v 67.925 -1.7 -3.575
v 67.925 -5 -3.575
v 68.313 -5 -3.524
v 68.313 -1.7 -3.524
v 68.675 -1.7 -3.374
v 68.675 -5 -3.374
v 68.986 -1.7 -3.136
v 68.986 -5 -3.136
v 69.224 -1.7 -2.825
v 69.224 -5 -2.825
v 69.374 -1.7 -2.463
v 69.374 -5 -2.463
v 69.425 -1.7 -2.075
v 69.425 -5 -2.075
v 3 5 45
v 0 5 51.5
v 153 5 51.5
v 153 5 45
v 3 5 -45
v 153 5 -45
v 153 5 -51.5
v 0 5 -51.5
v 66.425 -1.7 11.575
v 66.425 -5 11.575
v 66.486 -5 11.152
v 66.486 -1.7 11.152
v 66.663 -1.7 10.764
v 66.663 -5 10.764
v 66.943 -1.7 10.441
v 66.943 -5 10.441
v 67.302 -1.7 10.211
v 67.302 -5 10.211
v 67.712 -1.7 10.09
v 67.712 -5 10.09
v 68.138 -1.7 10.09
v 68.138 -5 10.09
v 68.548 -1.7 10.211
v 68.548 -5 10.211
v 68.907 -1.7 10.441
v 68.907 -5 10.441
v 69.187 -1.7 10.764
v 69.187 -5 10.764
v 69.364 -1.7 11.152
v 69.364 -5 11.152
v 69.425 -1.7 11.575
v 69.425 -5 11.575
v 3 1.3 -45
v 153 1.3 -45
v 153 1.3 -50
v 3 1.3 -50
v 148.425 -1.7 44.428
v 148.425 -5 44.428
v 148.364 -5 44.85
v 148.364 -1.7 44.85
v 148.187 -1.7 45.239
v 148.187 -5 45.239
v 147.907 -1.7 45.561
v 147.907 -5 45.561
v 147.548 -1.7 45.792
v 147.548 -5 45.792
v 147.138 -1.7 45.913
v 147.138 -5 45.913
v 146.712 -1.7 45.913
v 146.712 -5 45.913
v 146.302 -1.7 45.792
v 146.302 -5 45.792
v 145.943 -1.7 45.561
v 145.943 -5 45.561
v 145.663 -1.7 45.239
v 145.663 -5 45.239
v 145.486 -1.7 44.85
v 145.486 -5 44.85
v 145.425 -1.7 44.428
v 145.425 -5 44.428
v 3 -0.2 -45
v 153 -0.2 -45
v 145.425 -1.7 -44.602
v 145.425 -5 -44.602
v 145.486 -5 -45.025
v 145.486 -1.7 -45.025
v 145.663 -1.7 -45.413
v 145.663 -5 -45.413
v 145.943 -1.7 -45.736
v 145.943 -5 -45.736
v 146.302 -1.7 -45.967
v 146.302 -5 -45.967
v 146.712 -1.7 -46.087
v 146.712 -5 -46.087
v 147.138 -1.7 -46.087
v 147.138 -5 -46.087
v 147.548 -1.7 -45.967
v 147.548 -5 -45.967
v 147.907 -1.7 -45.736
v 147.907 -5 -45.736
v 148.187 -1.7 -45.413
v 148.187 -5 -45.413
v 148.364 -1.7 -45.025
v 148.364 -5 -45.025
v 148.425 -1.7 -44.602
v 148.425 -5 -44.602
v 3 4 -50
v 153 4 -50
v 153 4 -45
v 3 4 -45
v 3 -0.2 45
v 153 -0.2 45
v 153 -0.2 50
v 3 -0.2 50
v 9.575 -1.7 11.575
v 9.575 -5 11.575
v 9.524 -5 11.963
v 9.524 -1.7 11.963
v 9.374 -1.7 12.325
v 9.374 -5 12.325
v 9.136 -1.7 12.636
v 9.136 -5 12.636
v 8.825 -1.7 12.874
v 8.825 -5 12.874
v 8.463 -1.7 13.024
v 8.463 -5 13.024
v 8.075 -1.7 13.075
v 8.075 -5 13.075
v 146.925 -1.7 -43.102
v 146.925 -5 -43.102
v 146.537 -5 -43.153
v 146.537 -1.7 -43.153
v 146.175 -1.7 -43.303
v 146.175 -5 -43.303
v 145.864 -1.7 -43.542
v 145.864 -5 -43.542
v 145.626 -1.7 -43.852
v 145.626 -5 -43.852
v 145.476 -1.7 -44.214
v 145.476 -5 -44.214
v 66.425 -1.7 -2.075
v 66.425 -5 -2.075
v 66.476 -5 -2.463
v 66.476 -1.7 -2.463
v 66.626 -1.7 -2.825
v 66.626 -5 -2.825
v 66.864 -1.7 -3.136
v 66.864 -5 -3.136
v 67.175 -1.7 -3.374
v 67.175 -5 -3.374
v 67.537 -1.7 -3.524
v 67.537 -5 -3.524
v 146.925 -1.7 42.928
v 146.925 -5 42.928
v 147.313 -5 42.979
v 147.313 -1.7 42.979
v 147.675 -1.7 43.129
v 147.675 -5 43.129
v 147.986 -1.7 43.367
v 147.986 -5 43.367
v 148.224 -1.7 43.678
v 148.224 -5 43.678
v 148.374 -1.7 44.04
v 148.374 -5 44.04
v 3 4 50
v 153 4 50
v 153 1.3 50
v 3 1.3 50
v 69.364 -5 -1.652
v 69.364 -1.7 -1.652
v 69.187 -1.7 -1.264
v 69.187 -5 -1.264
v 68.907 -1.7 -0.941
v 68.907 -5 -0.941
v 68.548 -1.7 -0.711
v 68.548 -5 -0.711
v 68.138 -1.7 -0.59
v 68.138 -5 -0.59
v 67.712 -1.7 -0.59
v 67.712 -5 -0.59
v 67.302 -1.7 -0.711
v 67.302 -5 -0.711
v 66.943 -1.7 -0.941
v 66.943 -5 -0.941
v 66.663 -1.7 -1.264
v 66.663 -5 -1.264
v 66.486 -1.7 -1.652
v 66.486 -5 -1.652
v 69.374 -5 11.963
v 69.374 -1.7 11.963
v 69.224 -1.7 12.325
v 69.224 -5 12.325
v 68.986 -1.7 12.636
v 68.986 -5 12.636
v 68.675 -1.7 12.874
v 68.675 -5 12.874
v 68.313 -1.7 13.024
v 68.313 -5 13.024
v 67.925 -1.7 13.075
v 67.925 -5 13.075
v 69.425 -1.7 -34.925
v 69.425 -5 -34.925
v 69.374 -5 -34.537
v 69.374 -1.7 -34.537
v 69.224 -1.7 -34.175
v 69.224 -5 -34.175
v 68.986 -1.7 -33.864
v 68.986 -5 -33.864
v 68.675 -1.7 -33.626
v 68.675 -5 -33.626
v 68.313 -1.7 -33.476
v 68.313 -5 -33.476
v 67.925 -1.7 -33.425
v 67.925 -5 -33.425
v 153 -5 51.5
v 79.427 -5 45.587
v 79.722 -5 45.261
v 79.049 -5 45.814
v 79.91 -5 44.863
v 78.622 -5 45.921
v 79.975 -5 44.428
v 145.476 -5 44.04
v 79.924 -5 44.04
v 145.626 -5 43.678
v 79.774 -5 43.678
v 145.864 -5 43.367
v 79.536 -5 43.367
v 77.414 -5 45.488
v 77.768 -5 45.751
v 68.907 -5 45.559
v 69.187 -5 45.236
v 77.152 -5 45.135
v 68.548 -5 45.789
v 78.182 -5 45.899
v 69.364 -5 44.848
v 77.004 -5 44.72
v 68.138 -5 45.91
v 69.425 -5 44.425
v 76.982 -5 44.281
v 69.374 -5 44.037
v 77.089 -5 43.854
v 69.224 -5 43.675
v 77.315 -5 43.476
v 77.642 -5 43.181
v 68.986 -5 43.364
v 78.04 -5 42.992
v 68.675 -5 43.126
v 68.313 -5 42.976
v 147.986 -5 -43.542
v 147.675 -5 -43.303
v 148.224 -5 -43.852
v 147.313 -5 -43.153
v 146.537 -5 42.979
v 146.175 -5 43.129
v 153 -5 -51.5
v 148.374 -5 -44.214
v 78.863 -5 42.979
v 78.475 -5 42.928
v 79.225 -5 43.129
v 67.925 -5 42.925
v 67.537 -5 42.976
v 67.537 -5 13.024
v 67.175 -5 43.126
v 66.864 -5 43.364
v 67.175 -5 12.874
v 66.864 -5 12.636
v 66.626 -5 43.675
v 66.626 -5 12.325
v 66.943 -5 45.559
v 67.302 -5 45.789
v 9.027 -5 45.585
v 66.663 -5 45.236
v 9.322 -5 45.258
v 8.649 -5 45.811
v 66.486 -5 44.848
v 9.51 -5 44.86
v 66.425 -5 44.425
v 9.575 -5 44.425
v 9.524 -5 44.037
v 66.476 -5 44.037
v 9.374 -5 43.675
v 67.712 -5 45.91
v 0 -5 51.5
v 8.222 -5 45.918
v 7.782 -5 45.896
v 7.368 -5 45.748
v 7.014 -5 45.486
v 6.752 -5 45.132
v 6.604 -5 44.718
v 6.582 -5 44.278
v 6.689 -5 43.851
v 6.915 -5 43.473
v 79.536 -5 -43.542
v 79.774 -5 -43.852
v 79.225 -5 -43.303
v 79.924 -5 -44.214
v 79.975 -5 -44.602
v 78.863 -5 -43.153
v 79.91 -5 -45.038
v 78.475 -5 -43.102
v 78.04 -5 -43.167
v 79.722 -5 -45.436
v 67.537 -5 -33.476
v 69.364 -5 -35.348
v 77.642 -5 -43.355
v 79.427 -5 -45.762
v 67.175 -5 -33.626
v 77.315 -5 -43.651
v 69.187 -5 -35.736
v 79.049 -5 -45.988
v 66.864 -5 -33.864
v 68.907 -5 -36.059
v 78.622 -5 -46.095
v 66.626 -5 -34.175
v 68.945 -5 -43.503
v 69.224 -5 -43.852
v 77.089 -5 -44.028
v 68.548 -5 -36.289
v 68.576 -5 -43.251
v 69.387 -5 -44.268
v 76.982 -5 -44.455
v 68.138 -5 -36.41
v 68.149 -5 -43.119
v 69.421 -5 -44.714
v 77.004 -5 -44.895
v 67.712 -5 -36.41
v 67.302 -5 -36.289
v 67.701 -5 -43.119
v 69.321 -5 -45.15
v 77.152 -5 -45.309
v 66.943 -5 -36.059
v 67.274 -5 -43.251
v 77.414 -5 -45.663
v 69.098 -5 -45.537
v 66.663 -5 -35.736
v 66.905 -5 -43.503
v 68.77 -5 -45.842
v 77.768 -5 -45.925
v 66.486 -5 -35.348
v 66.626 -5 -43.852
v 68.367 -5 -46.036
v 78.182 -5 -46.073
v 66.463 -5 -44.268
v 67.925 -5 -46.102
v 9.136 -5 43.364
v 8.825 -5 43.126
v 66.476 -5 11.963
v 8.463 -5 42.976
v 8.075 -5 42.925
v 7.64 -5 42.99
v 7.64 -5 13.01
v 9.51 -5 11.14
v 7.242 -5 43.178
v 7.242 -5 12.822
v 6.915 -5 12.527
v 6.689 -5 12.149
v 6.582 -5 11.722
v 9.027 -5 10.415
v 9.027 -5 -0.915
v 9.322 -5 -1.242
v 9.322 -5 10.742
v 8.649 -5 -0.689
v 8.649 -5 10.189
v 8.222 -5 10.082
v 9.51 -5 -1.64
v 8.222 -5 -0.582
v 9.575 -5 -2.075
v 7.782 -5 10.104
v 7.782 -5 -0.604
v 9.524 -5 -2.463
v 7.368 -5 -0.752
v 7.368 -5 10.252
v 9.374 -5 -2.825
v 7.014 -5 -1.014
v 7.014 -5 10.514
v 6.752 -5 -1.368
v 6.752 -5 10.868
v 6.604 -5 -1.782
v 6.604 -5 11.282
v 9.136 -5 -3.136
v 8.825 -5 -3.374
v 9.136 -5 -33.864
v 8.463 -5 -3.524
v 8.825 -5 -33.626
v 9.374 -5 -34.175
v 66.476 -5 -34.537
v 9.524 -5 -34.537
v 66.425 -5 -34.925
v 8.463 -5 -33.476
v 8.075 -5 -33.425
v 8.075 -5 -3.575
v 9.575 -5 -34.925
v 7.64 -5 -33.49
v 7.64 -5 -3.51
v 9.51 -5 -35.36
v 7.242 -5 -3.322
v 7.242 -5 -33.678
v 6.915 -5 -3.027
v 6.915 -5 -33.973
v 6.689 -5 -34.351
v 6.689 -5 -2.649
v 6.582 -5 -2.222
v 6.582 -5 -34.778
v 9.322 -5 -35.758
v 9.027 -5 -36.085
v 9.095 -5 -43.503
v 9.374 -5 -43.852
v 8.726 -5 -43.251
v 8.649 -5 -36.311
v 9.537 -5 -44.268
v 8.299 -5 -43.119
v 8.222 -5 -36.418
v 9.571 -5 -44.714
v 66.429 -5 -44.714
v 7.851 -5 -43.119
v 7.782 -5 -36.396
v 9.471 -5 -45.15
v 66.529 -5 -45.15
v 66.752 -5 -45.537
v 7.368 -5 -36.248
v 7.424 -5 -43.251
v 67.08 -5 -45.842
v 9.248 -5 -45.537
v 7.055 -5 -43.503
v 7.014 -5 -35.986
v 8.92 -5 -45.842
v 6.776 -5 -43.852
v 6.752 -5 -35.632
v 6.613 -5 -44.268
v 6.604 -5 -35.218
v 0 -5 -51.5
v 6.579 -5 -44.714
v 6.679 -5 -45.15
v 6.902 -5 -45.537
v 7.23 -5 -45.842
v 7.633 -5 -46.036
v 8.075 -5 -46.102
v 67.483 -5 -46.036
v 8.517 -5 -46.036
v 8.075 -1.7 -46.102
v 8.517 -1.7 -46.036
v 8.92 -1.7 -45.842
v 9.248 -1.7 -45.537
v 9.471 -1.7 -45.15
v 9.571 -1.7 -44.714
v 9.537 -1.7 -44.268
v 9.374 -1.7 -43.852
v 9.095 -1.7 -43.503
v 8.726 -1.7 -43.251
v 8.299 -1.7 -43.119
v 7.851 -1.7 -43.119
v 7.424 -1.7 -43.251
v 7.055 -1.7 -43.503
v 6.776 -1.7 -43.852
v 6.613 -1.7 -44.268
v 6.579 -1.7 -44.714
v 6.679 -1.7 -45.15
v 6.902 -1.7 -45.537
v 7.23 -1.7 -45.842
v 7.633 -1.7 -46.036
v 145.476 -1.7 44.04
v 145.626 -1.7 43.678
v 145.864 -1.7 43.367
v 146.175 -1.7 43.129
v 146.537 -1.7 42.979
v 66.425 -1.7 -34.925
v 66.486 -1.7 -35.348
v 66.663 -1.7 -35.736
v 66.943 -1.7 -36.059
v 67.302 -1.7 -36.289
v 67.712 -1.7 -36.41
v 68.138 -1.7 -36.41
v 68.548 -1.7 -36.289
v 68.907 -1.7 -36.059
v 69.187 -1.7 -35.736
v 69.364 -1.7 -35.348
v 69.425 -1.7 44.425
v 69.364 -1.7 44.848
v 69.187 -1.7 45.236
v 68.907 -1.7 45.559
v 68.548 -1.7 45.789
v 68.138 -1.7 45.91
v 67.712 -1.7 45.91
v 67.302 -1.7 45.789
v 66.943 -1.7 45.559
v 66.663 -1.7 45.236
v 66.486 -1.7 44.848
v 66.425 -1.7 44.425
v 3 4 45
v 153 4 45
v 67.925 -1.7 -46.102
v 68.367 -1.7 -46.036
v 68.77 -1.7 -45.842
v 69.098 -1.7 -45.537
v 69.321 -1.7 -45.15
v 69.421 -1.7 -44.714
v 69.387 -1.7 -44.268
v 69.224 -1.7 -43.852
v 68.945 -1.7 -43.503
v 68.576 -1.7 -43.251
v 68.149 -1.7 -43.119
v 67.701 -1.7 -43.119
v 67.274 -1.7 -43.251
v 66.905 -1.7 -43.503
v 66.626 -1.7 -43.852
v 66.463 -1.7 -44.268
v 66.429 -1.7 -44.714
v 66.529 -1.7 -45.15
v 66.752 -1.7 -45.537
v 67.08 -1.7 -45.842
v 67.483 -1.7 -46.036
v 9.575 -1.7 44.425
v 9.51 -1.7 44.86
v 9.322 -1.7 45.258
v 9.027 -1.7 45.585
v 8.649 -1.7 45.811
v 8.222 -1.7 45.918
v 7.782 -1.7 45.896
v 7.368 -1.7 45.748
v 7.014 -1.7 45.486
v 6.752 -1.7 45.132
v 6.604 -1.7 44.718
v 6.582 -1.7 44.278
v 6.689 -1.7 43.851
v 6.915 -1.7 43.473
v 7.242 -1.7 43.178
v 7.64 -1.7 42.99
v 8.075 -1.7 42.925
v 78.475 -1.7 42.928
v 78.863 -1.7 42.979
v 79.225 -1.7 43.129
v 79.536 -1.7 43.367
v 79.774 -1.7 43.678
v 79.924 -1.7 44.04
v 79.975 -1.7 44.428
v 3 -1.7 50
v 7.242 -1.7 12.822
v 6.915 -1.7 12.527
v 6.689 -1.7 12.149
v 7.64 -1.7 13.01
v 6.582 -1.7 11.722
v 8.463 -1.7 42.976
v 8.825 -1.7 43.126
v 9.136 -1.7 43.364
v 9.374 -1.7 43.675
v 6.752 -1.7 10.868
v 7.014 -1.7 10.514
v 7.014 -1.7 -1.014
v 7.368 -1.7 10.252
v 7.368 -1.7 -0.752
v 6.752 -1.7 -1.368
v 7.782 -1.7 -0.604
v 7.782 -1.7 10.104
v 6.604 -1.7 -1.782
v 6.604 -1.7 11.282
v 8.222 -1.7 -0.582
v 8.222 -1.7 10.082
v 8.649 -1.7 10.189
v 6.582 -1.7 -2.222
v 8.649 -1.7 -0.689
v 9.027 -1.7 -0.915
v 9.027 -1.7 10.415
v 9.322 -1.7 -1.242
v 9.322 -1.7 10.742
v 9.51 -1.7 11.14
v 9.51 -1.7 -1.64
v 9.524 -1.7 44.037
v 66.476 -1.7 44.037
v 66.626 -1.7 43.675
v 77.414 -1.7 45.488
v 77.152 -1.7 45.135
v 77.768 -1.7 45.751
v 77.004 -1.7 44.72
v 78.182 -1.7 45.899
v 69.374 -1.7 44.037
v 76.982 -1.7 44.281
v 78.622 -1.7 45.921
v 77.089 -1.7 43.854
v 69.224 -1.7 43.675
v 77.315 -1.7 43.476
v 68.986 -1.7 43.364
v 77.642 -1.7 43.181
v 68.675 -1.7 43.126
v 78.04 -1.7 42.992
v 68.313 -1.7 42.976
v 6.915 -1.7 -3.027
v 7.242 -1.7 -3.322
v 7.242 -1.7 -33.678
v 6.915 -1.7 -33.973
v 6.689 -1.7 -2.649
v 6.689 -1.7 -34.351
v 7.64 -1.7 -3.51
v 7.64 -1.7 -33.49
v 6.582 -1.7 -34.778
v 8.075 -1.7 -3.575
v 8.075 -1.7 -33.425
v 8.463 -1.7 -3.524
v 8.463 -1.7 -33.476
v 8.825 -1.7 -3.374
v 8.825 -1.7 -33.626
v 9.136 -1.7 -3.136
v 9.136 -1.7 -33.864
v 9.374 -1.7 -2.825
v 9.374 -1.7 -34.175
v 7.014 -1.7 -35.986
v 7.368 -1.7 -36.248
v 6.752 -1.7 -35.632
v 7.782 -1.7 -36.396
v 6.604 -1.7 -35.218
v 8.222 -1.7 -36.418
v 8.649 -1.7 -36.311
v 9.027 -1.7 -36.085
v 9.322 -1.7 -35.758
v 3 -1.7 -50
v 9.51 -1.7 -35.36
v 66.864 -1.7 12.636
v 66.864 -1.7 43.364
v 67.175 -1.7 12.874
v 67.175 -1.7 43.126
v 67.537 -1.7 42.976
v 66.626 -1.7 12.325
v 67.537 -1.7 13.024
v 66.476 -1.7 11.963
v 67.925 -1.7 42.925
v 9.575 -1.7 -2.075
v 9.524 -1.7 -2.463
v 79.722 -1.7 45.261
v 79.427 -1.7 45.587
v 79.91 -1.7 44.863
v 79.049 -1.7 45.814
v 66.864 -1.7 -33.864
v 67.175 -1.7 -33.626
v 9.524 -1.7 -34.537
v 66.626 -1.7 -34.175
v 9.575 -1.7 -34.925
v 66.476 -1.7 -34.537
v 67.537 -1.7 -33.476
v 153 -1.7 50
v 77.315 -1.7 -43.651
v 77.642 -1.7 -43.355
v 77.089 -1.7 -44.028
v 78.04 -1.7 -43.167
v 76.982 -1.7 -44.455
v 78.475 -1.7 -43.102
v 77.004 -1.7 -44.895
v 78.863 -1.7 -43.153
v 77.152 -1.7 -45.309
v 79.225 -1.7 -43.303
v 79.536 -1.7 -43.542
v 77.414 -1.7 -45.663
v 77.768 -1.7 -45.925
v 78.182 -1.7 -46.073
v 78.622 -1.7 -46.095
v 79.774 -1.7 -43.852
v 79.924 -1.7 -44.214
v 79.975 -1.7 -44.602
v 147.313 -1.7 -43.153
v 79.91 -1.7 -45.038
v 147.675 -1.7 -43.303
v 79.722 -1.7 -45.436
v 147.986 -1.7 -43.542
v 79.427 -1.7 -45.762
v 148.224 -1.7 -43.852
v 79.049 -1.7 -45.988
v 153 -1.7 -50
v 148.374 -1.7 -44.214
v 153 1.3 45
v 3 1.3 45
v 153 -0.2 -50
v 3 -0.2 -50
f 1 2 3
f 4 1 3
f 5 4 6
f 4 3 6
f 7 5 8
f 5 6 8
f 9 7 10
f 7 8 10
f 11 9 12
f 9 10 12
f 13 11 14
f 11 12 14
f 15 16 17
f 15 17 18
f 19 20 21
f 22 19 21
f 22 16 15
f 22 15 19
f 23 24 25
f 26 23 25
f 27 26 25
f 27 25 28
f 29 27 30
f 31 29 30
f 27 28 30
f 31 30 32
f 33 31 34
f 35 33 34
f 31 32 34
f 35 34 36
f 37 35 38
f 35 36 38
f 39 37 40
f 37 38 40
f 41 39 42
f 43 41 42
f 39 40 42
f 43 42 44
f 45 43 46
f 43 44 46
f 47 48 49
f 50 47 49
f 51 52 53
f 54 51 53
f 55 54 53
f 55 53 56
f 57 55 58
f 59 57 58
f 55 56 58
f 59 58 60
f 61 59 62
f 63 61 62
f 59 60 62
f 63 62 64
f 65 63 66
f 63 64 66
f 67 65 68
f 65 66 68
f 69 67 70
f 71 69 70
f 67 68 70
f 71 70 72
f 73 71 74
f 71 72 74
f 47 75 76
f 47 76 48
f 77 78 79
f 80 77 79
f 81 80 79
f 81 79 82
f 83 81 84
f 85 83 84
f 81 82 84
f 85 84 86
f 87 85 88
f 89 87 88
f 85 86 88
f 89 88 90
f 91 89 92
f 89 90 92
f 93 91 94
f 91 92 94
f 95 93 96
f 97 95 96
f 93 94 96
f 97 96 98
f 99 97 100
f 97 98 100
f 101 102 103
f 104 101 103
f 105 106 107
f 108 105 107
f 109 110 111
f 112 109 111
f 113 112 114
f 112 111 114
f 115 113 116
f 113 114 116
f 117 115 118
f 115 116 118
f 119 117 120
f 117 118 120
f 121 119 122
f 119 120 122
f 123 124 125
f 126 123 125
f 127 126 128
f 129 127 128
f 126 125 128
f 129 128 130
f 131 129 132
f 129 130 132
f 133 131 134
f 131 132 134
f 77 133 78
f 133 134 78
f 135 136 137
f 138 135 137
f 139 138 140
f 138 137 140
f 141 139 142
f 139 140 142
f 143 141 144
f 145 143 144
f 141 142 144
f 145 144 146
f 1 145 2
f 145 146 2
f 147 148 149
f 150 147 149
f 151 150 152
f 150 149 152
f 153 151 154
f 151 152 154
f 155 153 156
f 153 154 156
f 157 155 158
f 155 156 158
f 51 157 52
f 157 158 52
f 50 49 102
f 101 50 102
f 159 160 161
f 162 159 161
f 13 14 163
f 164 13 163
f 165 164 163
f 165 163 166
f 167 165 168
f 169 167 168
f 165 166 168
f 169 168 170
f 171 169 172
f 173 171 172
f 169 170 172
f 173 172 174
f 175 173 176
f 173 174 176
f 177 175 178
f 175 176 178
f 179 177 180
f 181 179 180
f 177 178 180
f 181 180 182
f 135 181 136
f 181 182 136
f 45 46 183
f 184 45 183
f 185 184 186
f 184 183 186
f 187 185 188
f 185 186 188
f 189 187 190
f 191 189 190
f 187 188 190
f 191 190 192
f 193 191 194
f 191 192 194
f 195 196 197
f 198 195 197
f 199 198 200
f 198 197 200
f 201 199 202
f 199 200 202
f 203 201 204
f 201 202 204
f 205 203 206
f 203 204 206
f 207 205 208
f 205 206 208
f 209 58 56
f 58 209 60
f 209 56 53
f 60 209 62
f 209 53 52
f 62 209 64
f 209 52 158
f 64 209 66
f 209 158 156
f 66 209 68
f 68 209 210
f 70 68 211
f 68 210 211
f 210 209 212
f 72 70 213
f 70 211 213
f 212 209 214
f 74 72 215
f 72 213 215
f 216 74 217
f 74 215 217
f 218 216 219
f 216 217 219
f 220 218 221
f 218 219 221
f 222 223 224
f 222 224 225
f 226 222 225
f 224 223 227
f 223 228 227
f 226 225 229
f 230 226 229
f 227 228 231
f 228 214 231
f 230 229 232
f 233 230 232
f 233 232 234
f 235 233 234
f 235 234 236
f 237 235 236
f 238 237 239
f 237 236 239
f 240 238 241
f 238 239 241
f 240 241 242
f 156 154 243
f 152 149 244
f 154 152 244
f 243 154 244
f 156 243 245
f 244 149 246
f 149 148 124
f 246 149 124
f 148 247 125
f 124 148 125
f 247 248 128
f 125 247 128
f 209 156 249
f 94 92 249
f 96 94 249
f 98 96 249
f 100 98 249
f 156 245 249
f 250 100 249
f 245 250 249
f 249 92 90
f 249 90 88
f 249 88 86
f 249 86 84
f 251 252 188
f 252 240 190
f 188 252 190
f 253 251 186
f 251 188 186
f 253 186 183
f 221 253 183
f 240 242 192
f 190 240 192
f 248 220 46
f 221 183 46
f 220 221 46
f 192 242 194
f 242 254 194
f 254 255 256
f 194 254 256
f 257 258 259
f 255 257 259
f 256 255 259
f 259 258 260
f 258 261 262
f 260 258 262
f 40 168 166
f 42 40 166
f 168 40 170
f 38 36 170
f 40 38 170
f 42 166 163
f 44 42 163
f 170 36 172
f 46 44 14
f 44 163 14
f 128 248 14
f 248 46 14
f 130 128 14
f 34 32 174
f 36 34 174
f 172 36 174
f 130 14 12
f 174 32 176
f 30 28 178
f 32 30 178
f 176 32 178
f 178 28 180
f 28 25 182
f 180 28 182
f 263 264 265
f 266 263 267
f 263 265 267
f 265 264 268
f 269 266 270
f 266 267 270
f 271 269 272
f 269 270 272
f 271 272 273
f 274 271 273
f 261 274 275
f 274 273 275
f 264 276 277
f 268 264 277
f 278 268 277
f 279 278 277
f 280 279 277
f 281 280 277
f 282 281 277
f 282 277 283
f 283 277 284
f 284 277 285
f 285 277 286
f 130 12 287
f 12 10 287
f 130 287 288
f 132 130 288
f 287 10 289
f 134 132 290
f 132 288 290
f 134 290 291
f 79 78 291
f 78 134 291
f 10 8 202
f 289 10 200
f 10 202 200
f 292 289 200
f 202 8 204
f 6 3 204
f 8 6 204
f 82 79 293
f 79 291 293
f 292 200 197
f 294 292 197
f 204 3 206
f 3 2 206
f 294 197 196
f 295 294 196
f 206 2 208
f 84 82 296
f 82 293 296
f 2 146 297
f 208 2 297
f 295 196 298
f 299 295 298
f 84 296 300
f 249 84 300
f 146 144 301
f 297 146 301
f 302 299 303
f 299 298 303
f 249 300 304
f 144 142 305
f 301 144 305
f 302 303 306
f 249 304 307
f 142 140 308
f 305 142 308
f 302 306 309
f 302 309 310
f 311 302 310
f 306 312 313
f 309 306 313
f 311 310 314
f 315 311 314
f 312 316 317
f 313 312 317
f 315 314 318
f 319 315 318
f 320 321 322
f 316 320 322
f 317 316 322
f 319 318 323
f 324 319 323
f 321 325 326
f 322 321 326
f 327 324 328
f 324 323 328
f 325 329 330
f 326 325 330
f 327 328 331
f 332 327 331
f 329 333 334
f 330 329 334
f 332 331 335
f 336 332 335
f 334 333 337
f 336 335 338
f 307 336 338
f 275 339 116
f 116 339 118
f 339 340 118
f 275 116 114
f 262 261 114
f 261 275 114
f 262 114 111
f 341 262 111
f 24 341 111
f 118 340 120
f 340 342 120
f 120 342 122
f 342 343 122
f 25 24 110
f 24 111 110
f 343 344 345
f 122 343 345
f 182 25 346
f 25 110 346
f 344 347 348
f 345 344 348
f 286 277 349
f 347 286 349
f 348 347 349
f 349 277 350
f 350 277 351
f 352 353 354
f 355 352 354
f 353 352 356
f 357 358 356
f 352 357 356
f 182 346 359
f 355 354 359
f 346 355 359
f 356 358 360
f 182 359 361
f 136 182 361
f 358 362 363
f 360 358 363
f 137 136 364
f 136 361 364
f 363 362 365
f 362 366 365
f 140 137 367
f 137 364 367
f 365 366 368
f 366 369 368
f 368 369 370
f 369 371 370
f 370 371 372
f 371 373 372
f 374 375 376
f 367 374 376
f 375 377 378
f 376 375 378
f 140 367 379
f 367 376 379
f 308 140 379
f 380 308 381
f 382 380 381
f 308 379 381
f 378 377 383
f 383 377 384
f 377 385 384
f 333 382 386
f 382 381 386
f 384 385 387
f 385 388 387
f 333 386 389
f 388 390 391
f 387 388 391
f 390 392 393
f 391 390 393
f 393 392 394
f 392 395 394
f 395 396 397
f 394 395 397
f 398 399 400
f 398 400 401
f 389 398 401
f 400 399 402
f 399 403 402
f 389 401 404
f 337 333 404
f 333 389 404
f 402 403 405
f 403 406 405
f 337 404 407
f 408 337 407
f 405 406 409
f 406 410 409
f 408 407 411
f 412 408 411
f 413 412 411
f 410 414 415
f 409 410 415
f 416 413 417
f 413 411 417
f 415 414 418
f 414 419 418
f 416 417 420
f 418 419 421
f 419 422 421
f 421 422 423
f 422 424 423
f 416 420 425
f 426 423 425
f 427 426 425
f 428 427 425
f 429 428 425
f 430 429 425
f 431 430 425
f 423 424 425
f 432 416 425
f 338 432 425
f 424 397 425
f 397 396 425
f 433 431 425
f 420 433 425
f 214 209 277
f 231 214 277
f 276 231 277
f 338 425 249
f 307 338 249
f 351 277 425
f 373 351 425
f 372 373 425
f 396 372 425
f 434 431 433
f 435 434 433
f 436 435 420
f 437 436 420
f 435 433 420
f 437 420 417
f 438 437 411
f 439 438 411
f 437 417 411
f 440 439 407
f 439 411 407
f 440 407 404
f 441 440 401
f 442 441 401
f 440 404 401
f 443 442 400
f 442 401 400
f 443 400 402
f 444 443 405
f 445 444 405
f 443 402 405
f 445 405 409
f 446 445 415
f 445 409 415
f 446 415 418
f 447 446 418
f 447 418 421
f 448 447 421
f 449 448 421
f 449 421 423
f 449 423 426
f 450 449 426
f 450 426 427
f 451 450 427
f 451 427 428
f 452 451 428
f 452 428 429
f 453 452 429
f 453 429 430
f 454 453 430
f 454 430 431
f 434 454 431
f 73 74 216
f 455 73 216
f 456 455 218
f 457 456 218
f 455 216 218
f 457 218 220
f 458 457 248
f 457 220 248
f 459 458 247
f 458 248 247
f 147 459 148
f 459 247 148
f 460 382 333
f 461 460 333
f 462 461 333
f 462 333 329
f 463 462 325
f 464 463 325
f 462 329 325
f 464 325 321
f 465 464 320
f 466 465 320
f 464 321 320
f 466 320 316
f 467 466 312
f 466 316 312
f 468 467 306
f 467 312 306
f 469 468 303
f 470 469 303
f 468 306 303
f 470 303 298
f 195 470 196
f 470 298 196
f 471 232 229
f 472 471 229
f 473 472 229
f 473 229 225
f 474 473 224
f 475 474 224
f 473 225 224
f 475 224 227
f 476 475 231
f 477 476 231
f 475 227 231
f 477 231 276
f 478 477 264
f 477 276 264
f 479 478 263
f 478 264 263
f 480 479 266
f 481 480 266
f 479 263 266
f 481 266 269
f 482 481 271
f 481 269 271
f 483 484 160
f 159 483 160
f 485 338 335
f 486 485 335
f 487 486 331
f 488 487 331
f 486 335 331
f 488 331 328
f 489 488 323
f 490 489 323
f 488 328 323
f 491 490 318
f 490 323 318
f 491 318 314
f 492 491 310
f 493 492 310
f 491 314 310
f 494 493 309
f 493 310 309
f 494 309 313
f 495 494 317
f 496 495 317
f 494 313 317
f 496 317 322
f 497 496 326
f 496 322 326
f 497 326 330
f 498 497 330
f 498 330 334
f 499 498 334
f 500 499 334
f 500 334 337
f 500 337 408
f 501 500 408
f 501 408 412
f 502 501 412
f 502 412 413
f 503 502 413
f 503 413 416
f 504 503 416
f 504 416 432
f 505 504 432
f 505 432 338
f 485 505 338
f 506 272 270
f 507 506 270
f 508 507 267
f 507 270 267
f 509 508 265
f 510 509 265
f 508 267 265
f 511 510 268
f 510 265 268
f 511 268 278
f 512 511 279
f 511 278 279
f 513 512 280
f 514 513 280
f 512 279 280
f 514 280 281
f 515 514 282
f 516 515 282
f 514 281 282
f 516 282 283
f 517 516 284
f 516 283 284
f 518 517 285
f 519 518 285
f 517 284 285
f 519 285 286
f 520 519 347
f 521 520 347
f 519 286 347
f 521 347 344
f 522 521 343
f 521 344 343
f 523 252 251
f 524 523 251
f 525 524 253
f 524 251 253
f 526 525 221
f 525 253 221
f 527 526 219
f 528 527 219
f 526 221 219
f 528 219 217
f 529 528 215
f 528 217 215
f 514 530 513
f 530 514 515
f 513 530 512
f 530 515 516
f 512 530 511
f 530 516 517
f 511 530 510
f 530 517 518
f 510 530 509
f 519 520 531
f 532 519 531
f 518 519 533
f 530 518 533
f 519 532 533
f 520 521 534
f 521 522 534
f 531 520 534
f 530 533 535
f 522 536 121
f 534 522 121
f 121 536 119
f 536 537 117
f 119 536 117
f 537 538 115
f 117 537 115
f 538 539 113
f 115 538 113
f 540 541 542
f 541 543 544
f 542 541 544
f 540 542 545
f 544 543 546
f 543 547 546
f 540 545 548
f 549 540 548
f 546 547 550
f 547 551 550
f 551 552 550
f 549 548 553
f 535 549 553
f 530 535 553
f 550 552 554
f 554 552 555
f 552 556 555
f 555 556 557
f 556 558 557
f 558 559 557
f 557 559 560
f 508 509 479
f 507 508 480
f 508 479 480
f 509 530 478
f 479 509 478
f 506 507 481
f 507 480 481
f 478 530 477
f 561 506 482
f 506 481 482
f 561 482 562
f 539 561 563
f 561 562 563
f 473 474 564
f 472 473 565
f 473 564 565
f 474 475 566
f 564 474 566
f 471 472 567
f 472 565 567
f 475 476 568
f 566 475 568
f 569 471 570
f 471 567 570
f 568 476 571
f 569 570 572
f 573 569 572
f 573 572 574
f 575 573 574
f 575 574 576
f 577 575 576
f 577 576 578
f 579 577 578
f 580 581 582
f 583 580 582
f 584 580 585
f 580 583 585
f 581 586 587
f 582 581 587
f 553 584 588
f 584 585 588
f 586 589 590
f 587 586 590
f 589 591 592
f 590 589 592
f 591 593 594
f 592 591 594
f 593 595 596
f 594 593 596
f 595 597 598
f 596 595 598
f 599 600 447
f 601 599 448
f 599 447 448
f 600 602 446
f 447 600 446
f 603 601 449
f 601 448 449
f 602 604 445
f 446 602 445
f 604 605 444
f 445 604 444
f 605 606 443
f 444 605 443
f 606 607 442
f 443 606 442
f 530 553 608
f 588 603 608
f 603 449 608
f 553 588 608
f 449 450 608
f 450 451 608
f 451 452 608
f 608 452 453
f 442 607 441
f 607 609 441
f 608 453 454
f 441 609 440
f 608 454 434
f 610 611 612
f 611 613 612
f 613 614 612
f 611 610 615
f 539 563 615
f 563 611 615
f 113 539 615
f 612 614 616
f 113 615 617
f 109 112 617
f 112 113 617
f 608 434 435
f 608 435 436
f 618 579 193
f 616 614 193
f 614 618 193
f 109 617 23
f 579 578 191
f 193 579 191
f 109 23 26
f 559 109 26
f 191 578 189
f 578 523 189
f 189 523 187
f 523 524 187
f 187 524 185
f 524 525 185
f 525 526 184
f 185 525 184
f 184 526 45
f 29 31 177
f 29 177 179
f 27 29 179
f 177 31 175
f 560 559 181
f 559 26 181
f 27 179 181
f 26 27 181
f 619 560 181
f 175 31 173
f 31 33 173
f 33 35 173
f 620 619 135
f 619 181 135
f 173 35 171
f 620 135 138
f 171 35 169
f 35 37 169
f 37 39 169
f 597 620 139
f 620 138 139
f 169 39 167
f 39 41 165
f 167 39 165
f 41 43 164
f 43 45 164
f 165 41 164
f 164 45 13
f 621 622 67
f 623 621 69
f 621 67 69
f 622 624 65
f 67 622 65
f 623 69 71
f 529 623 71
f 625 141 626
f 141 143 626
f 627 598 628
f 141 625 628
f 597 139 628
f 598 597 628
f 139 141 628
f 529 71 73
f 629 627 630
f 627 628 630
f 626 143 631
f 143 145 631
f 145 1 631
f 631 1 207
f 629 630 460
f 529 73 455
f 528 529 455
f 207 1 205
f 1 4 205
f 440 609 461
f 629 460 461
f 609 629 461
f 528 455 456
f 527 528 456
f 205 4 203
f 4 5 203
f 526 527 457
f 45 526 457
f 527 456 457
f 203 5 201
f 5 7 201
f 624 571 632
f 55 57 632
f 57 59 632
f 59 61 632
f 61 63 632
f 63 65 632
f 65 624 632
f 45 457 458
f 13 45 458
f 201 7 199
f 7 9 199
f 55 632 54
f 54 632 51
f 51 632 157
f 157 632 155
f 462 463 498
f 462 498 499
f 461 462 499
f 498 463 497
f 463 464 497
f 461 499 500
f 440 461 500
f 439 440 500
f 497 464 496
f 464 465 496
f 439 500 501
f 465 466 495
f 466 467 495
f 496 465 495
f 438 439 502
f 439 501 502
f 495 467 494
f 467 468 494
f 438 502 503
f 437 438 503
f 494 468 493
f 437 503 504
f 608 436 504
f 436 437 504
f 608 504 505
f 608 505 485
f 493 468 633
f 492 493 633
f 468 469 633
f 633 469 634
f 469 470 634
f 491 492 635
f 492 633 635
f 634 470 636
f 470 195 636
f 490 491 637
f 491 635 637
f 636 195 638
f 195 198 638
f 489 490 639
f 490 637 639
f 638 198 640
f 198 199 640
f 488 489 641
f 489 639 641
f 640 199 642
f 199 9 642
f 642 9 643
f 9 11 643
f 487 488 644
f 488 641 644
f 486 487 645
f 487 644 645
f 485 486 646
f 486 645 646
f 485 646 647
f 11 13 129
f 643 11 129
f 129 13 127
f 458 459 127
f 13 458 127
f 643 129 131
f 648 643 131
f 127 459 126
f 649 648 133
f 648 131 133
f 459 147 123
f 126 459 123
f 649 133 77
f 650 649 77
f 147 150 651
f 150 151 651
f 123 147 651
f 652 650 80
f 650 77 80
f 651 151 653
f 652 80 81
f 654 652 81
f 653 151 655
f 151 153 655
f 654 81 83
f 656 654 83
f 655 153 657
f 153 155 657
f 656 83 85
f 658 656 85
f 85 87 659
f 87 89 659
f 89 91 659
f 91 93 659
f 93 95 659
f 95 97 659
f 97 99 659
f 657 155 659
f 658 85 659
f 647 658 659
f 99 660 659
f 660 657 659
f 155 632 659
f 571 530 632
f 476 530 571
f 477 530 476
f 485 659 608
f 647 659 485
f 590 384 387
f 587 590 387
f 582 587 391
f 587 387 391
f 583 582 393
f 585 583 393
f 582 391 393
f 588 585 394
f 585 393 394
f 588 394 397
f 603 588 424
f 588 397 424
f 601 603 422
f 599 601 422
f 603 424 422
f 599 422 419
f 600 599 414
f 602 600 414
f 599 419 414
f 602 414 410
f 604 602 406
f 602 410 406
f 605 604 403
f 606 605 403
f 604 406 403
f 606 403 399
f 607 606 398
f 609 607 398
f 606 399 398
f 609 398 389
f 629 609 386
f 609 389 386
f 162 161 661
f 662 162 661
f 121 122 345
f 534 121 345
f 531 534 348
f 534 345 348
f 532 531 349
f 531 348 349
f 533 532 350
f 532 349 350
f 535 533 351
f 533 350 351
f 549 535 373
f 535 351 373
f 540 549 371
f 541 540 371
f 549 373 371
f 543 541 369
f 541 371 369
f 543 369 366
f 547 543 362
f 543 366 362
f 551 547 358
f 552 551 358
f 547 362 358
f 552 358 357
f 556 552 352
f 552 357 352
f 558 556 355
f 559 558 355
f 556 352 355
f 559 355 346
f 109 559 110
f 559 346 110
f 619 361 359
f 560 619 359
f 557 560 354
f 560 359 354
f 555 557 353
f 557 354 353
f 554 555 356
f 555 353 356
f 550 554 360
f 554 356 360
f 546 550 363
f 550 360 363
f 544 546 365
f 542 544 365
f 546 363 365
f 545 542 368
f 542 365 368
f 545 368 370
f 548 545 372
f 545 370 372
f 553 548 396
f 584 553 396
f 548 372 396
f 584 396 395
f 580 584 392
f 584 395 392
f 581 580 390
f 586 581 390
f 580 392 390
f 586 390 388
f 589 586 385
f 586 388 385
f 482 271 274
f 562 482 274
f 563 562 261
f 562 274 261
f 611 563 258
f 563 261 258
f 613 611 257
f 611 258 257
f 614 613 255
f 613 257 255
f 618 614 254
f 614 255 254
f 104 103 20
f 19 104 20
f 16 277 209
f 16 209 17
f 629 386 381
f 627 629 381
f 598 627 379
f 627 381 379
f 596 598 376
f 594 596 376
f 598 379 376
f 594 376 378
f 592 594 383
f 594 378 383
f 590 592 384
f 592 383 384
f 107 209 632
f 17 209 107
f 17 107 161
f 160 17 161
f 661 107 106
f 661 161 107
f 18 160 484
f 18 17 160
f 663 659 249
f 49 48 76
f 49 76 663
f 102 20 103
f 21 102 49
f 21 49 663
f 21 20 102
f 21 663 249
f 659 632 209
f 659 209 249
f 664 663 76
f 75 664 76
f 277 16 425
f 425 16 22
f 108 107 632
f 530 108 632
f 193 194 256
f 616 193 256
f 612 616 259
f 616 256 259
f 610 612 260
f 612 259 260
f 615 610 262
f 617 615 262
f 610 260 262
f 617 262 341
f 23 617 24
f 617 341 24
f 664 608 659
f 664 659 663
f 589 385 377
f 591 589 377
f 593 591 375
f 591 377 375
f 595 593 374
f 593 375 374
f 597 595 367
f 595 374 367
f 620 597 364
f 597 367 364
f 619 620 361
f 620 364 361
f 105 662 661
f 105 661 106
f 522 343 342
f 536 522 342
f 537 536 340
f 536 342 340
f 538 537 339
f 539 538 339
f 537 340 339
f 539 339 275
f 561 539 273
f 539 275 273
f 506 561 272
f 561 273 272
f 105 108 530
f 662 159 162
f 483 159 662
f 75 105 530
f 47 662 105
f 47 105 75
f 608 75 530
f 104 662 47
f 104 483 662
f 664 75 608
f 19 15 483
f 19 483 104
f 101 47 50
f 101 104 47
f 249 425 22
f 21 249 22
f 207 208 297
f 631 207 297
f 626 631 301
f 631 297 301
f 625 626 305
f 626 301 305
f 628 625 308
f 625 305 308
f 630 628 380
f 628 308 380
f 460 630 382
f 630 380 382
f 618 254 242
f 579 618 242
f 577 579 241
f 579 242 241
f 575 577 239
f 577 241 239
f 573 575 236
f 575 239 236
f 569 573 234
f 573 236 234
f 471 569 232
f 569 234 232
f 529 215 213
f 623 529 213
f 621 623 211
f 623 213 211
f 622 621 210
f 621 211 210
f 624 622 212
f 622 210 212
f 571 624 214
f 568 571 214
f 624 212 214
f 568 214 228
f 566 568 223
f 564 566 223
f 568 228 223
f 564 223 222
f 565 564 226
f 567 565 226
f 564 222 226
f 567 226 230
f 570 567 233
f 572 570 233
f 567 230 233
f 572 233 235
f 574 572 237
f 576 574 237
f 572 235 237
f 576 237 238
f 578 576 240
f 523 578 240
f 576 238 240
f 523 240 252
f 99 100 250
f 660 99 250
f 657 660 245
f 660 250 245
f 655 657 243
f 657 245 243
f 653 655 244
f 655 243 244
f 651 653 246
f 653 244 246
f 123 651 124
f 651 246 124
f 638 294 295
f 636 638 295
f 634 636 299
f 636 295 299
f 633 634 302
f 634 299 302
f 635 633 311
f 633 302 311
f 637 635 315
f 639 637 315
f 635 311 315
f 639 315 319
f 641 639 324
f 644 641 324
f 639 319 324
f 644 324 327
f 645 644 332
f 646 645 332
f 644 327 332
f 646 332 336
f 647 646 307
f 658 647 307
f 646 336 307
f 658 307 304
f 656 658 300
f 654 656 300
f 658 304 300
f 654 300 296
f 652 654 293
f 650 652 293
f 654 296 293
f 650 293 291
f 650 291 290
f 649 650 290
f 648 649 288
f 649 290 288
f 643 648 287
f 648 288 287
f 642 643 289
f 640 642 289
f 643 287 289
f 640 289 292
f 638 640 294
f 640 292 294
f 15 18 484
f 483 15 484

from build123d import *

# Parameters (mm, degrees)
SKETCH_1_W          = 103
SKETCH_1_H          = 10
EXTRUDE_1_DEPTH     = 153
CUT_EXTRUDE_1_DEPTH = 150
CUT_EXTRUDE_2_DEPTH = 150
CUT_EXTRUDE_3_DEPTH = 150
CUT_EXTRUDE_4_DEPTH = 150
CUT_EXTRUDE_6_DEPTH = 4
SKETCH_7_R          = 1.5
CUT_EXTRUDE_7_DEPTH = 4


with BuildPart() as part:
    # 草图1 → 凸台-拉伸1 (new body)
    with BuildSketch(Plane(origin=(0, 0, 0), x_dir=(0, 0, -1), z_dir=(1, 0, 0))):
        Rectangle(SKETCH_1_W, SKETCH_1_H)
    extrude(amount=EXTRUDE_1_DEPTH)

    # 草图2 → 切除-拉伸1 (cut)
    with BuildSketch(Plane(origin=(153, 0, 0), x_dir=(0, 0, -1), z_dir=(1, 0, 0))):
        Polygon((0, 5), (-45, 5), (-45, 4), (45, 4), (45, 5), align=None)
    extrude(amount=-CUT_EXTRUDE_1_DEPTH, mode=Mode.SUBTRACT)

    # 草图3 → 切除-拉伸2 (cut)
    with BuildSketch(Plane(origin=(153, 0, 0), x_dir=(0, 0, -1), z_dir=(1, 0, 0))):
        Polygon((0, 4), (-50, 4), (-50, 1.3), (50, 1.3), (50, 4), align=None)
    extrude(amount=-CUT_EXTRUDE_2_DEPTH, mode=Mode.SUBTRACT)

    # 草图4 → 切除-拉伸3 (cut)
    with BuildSketch(Plane(origin=(153, 0, 0), x_dir=(0, 0, -1), z_dir=(1, 0, 0))):
        Polygon((0, 1.3), (-45, 1.3), (-45, -0.2), (45, -0.2), (45, 1.3), align=None)
    extrude(amount=-CUT_EXTRUDE_3_DEPTH, mode=Mode.SUBTRACT)

    # 草图5 → 切除-拉伸4 (cut)
    with BuildSketch(Plane(origin=(153, 0, 0), x_dir=(0, 0, -1), z_dir=(1, 0, 0))):
        Polygon((0, -0.2), (-50, -0.2), (-50, -1.7), (50, -1.7), (50, -0.2), align=None)
    extrude(amount=-CUT_EXTRUDE_4_DEPTH, mode=Mode.SUBTRACT)

    # 草图6 → 切除-拉伸6 (cut)
    with BuildSketch(Plane.XZ.offset(5)):
        with BuildLine():
            Line((78.475, 42.927791829), (78.475, 44.427791829))
            Line((78.475, 44.427791829), (79.975, 44.427791829))
            ThreePointArc((79.975, 44.427791829), (77.414339828, 45.488452001), (78.475, 42.927791829))
        make_face()
        with BuildLine():
            Line((79.975, 44.427791829), (78.475, 44.427791829))
            Line((78.475, 44.427791829), (78.475, 42.927791829))
            ThreePointArc((78.475, 42.927791829), (79.535660172, 43.367131657), (79.975, 44.427791829))
        make_face()
        with BuildLine():
            ThreePointArc((148.425, 44.427791829), (146.925, 45.927791829), (145.425, 44.427791829))
            Line((145.425, 44.427791829), (146.925, 44.427791829))
            Line((146.925, 44.427791829), (146.925, 42.927791829))
            ThreePointArc((146.925, 42.927791829), (147.985660172, 43.367131657), (148.425, 44.427791829))
        make_face()
        with BuildLine():
            Line((146.925, 44.427791829), (145.425, 44.427791829))
            ThreePointArc((145.425, 44.427791829), (145.864339828, 43.367131657), (146.925, 42.927791829))
            Line((146.925, 42.927791829), (146.925, 44.427791829))
        make_face()
        with BuildLine():
            ThreePointArc((79.975, -44.602208171), (79.535660172, -43.541547999), (78.475, -43.102208171))
            Line((78.475, -43.102208171), (78.475, -44.602208171))
            Line((78.475, -44.602208171), (79.975, -44.602208171))
        make_face()
        with BuildLine():
            Line((78.475, -44.602208171), (78.475, -43.102208171))
            ThreePointArc((78.475, -43.102208171), (77.414339828, -45.662868343), (79.975, -44.602208171))
            Line((79.975, -44.602208171), (78.475, -44.602208171))
        make_face()
        with BuildLine():
            ThreePointArc((148.425, -44.602208171), (147.985660172, -43.541547999), (146.925, -43.102208171))
            Line((146.925, -43.102208171), (146.925, -44.602208171))
            Line((146.925, -44.602208171), (145.425, -44.602208171))
            ThreePointArc((145.425, -44.602208171), (146.925, -46.102208171), (148.425, -44.602208171))
        make_face()
        with BuildLine():
            Line((146.925, -44.602208171), (146.925, -43.102208171))
            ThreePointArc((146.925, -43.102208171), (145.864339828, -43.541547999), (145.425, -44.602208171))
            Line((145.425, -44.602208171), (146.925, -44.602208171))
        make_face()
    extrude(amount=-CUT_EXTRUDE_6_DEPTH, mode=Mode.SUBTRACT)

    # 草图7 → 切除-拉伸7 (cut)
    with BuildSketch(Plane.XZ.offset(5)):
        with BuildLine():
            Line((8.075, 42.925), (8.075, 44.425))
            Line((8.075, 44.425), (9.575, 44.425))
            ThreePointArc((9.575, 44.425), (7.014339828, 45.485660172), (8.075, 42.925))
        make_face()
        with BuildLine():
            Line((9.575, 44.425), (8.075, 44.425))
            Line((8.075, 44.425), (8.075, 42.925))
            ThreePointArc((8.075, 42.925), (9.135660172, 43.364339828), (9.575, 44.425))
        make_face()
        with BuildLine():
            ThreePointArc((69.425, 44.425), (67.925, 45.925), (66.425, 44.425))
            Line((66.425, 44.425), (67.925, 44.425))
            Line((67.925, 44.425), (67.925, 42.925))
            ThreePointArc((67.925, 42.925), (68.985660172, 43.364339828), (69.425, 44.425))
        make_face()
        with BuildLine():
            Line((67.925, 44.425), (66.425, 44.425))
            ThreePointArc((66.425, 44.425), (66.864339828, 43.364339828), (67.925, 42.925))
            Line((67.925, 42.925), (67.925, 44.425))
        make_face()
        with BuildLine():
            Line((8.075, -3.575), (8.075, -2.075))
            Line((8.075, -2.075), (9.575, -2.075))
            ThreePointArc((9.575, -2.075), (7.014339828, -1.014339828), (8.075, -3.575))
        make_face()
        with BuildLine():
            Line((9.575, -2.075), (8.075, -2.075))
            Line((8.075, -2.075), (8.075, -3.575))
            ThreePointArc((8.075, -3.575), (9.135660172, -3.135660172), (9.575, -2.075))
        make_face()
        with BuildLine():
            ThreePointArc((69.425, -2.075), (67.925, -0.575), (66.425, -2.075))
            Line((66.425, -2.075), (67.925, -2.075))
            Line((67.925, -2.075), (67.925, -3.575))
            ThreePointArc((67.925, -3.575), (68.985660172, -3.135660172), (69.425, -2.075))
        make_face()
        with BuildLine():
            Line((67.925, -2.075), (66.425, -2.075))
            ThreePointArc((66.425, -2.075), (66.864339828, -3.135660172), (67.925, -3.575))
            Line((67.925, -3.575), (67.925, -2.075))
        make_face()
        with BuildLine():
            ThreePointArc((69.425, 11.575), (68.985660172, 12.635660172), (67.925, 13.075))
            Line((67.925, 13.075), (67.925, 11.575))
            Line((67.925, 11.575), (66.425, 11.575))
            ThreePointArc((66.425, 11.575), (67.925, 10.075), (69.425, 11.575))
        make_face()
        with BuildLine():
            Line((67.925, 11.575), (67.925, 13.075))
            ThreePointArc((67.925, 13.075), (66.864339828, 12.635660172), (66.425, 11.575))
            Line((66.425, 11.575), (67.925, 11.575))
        make_face()
        with BuildLine():
            ThreePointArc((9.575, 11.575), (9.135660172, 12.635660172), (8.075, 13.075))
            Line((8.075, 13.075), (8.075, 11.575))
            Line((8.075, 11.575), (9.575, 11.575))
        make_face()
        with BuildLine():
            Line((8.075, 11.575), (8.075, 13.075))
            ThreePointArc((8.075, 13.075), (7.014339828, 10.514339828), (9.575, 11.575))
            Line((9.575, 11.575), (8.075, 11.575))
        make_face()
        with BuildLine():
            ThreePointArc((9.575, -34.925), (9.135660172, -33.864339828), (8.075, -33.425))
            Line((8.075, -33.425), (8.075, -34.925))
            Line((8.075, -34.925), (9.575, -34.925))
        make_face()
        with BuildLine():
            Line((8.075, -34.925), (8.075, -33.425))
            ThreePointArc((8.075, -33.425), (7.014339828, -35.985660172), (9.575, -34.925))
            Line((9.575, -34.925), (8.075, -34.925))
        make_face()
        with BuildLine():
            ThreePointArc((69.425, -34.925), (68.985660172, -33.864339828), (67.925, -33.425))
            Line((67.925, -33.425), (67.925, -34.925))
            Line((67.925, -34.925), (66.425, -34.925))
            ThreePointArc((66.425, -34.925), (67.925, -36.425), (69.425, -34.925))
        make_face()
        with BuildLine():
            Line((67.925, -34.925), (67.925, -33.425))
            ThreePointArc((67.925, -33.425), (66.864339828, -33.864339828), (66.425, -34.925))
            Line((66.425, -34.925), (67.925, -34.925))
        make_face()
        with Locations(Location((67.925, -44.602208171, 0), (0, 0, 270))):
            Circle(SKETCH_7_R)
        with Locations(Location((8.075, -44.602208171, 0), (0, 0, 270))):
            Circle(SKETCH_7_R)
    extrude(amount=-CUT_EXTRUDE_7_DEPTH, mode=Mode.SUBTRACT)


solid = part.part
